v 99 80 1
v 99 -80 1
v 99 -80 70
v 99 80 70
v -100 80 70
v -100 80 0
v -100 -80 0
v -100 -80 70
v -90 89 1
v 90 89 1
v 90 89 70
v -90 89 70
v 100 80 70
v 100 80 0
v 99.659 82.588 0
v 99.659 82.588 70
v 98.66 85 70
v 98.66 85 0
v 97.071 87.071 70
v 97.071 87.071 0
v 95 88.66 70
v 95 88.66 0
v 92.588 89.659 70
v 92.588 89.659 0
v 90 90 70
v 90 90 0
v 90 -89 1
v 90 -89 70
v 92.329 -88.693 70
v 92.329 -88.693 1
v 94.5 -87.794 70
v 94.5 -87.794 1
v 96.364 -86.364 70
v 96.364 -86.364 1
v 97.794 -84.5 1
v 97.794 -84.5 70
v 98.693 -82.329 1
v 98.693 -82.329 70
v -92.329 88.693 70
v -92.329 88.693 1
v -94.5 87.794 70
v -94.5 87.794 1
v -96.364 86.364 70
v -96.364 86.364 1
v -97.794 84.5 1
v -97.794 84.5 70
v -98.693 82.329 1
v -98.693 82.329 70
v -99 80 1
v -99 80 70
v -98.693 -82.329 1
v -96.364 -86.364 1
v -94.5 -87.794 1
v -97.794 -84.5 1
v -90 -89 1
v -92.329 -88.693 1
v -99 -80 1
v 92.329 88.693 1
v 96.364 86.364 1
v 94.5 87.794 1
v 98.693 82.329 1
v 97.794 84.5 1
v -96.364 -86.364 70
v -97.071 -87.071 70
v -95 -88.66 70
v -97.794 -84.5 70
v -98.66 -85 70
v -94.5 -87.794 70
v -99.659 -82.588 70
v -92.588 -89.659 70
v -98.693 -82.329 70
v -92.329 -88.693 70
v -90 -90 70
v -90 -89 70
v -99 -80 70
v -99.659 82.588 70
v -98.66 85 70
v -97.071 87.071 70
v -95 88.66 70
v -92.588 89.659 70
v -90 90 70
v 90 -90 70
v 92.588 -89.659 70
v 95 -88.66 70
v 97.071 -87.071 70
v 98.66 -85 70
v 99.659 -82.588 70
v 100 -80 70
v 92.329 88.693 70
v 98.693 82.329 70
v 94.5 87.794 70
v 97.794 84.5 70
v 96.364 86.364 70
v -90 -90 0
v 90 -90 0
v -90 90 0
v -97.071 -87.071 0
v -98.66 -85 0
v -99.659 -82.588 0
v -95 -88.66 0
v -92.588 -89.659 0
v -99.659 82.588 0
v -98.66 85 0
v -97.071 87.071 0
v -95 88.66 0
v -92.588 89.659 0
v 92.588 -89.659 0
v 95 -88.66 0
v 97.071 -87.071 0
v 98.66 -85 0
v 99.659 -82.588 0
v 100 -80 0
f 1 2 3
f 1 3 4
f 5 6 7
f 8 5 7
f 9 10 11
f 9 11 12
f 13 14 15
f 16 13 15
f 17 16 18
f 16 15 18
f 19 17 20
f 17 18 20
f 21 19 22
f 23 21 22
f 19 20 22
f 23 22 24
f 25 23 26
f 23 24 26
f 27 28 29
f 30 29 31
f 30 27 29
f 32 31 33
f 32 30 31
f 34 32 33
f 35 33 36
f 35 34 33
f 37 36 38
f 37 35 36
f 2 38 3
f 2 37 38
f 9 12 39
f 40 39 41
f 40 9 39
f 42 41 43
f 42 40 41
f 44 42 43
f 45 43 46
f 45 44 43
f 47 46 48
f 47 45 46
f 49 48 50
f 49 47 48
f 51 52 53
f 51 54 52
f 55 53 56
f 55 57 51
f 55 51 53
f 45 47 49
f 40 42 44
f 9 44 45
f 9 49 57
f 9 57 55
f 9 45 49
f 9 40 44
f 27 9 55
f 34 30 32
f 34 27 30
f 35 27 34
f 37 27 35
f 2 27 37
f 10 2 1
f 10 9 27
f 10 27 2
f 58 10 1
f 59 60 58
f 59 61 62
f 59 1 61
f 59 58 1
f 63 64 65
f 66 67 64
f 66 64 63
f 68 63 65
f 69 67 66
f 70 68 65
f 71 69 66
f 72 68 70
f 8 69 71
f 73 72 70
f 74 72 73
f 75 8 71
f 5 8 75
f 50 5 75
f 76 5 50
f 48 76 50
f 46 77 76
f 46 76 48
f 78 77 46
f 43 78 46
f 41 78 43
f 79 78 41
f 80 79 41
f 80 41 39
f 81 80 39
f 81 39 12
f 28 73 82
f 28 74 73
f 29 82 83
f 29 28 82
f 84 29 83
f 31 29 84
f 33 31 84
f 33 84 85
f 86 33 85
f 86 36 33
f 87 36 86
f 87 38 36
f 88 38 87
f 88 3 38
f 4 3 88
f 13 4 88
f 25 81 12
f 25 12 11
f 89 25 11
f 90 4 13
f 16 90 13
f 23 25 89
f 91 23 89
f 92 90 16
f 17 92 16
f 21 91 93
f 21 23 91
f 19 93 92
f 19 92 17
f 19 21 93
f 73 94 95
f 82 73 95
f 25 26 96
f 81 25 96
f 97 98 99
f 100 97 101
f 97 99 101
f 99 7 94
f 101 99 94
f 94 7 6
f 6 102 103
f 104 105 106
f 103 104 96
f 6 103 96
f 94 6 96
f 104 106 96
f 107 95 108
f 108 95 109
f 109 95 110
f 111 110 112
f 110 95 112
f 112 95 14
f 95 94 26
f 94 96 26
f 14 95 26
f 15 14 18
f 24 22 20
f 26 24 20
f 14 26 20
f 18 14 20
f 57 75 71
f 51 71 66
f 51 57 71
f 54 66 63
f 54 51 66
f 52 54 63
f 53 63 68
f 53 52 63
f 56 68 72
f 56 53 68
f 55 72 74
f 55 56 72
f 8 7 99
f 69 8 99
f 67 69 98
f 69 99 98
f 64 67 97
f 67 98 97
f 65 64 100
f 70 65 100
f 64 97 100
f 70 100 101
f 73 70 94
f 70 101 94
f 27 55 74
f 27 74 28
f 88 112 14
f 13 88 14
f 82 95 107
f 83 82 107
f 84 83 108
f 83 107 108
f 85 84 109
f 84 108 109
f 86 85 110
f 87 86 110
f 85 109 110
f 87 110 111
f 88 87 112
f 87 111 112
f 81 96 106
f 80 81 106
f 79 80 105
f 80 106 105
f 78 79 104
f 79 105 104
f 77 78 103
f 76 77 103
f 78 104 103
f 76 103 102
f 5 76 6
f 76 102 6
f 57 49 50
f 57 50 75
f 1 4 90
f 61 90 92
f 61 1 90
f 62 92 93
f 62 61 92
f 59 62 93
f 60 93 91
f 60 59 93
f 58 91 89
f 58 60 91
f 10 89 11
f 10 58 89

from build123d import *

# Parameters (mm, degrees)
EXTRUDE_1_DEPTH = 70
SHELL_1_T       = -1


with BuildPart() as part:
    # 草图1 → 凸台-拉伸1 (new body)
    with BuildSketch(Plane.XY):
        with BuildLine():
            Line((-90, -90), (90, -90))
            ThreePointArc((90, -90), (97.071067812, -87.071067812), (100, -80))
            Line((100, -80), (100, 80))
            ThreePointArc((100, 80), (97.071067812, 87.071067812), (90, 90))
            Line((90, 90), (-90, 90))
            ThreePointArc((-90, 90), (-97.071067812, 87.071067812), (-100, 80))
            Line((-100, 80), (-100, -80))
            ThreePointArc((-100, -80), (-97.071067812, -87.071067812), (-90, -90))
        make_face()
    extrude(amount=EXTRUDE_1_DEPTH)

    # 抽壳1
    shell_1_openings = [part.faces().sort_by_distance(p)[0] for p in [
        (0, 0, 70),
    ]]
    offset(amount=SHELL_1_T, openings=shell_1_openings, kind=Kind.INTERSECTION)


solid = part.part
